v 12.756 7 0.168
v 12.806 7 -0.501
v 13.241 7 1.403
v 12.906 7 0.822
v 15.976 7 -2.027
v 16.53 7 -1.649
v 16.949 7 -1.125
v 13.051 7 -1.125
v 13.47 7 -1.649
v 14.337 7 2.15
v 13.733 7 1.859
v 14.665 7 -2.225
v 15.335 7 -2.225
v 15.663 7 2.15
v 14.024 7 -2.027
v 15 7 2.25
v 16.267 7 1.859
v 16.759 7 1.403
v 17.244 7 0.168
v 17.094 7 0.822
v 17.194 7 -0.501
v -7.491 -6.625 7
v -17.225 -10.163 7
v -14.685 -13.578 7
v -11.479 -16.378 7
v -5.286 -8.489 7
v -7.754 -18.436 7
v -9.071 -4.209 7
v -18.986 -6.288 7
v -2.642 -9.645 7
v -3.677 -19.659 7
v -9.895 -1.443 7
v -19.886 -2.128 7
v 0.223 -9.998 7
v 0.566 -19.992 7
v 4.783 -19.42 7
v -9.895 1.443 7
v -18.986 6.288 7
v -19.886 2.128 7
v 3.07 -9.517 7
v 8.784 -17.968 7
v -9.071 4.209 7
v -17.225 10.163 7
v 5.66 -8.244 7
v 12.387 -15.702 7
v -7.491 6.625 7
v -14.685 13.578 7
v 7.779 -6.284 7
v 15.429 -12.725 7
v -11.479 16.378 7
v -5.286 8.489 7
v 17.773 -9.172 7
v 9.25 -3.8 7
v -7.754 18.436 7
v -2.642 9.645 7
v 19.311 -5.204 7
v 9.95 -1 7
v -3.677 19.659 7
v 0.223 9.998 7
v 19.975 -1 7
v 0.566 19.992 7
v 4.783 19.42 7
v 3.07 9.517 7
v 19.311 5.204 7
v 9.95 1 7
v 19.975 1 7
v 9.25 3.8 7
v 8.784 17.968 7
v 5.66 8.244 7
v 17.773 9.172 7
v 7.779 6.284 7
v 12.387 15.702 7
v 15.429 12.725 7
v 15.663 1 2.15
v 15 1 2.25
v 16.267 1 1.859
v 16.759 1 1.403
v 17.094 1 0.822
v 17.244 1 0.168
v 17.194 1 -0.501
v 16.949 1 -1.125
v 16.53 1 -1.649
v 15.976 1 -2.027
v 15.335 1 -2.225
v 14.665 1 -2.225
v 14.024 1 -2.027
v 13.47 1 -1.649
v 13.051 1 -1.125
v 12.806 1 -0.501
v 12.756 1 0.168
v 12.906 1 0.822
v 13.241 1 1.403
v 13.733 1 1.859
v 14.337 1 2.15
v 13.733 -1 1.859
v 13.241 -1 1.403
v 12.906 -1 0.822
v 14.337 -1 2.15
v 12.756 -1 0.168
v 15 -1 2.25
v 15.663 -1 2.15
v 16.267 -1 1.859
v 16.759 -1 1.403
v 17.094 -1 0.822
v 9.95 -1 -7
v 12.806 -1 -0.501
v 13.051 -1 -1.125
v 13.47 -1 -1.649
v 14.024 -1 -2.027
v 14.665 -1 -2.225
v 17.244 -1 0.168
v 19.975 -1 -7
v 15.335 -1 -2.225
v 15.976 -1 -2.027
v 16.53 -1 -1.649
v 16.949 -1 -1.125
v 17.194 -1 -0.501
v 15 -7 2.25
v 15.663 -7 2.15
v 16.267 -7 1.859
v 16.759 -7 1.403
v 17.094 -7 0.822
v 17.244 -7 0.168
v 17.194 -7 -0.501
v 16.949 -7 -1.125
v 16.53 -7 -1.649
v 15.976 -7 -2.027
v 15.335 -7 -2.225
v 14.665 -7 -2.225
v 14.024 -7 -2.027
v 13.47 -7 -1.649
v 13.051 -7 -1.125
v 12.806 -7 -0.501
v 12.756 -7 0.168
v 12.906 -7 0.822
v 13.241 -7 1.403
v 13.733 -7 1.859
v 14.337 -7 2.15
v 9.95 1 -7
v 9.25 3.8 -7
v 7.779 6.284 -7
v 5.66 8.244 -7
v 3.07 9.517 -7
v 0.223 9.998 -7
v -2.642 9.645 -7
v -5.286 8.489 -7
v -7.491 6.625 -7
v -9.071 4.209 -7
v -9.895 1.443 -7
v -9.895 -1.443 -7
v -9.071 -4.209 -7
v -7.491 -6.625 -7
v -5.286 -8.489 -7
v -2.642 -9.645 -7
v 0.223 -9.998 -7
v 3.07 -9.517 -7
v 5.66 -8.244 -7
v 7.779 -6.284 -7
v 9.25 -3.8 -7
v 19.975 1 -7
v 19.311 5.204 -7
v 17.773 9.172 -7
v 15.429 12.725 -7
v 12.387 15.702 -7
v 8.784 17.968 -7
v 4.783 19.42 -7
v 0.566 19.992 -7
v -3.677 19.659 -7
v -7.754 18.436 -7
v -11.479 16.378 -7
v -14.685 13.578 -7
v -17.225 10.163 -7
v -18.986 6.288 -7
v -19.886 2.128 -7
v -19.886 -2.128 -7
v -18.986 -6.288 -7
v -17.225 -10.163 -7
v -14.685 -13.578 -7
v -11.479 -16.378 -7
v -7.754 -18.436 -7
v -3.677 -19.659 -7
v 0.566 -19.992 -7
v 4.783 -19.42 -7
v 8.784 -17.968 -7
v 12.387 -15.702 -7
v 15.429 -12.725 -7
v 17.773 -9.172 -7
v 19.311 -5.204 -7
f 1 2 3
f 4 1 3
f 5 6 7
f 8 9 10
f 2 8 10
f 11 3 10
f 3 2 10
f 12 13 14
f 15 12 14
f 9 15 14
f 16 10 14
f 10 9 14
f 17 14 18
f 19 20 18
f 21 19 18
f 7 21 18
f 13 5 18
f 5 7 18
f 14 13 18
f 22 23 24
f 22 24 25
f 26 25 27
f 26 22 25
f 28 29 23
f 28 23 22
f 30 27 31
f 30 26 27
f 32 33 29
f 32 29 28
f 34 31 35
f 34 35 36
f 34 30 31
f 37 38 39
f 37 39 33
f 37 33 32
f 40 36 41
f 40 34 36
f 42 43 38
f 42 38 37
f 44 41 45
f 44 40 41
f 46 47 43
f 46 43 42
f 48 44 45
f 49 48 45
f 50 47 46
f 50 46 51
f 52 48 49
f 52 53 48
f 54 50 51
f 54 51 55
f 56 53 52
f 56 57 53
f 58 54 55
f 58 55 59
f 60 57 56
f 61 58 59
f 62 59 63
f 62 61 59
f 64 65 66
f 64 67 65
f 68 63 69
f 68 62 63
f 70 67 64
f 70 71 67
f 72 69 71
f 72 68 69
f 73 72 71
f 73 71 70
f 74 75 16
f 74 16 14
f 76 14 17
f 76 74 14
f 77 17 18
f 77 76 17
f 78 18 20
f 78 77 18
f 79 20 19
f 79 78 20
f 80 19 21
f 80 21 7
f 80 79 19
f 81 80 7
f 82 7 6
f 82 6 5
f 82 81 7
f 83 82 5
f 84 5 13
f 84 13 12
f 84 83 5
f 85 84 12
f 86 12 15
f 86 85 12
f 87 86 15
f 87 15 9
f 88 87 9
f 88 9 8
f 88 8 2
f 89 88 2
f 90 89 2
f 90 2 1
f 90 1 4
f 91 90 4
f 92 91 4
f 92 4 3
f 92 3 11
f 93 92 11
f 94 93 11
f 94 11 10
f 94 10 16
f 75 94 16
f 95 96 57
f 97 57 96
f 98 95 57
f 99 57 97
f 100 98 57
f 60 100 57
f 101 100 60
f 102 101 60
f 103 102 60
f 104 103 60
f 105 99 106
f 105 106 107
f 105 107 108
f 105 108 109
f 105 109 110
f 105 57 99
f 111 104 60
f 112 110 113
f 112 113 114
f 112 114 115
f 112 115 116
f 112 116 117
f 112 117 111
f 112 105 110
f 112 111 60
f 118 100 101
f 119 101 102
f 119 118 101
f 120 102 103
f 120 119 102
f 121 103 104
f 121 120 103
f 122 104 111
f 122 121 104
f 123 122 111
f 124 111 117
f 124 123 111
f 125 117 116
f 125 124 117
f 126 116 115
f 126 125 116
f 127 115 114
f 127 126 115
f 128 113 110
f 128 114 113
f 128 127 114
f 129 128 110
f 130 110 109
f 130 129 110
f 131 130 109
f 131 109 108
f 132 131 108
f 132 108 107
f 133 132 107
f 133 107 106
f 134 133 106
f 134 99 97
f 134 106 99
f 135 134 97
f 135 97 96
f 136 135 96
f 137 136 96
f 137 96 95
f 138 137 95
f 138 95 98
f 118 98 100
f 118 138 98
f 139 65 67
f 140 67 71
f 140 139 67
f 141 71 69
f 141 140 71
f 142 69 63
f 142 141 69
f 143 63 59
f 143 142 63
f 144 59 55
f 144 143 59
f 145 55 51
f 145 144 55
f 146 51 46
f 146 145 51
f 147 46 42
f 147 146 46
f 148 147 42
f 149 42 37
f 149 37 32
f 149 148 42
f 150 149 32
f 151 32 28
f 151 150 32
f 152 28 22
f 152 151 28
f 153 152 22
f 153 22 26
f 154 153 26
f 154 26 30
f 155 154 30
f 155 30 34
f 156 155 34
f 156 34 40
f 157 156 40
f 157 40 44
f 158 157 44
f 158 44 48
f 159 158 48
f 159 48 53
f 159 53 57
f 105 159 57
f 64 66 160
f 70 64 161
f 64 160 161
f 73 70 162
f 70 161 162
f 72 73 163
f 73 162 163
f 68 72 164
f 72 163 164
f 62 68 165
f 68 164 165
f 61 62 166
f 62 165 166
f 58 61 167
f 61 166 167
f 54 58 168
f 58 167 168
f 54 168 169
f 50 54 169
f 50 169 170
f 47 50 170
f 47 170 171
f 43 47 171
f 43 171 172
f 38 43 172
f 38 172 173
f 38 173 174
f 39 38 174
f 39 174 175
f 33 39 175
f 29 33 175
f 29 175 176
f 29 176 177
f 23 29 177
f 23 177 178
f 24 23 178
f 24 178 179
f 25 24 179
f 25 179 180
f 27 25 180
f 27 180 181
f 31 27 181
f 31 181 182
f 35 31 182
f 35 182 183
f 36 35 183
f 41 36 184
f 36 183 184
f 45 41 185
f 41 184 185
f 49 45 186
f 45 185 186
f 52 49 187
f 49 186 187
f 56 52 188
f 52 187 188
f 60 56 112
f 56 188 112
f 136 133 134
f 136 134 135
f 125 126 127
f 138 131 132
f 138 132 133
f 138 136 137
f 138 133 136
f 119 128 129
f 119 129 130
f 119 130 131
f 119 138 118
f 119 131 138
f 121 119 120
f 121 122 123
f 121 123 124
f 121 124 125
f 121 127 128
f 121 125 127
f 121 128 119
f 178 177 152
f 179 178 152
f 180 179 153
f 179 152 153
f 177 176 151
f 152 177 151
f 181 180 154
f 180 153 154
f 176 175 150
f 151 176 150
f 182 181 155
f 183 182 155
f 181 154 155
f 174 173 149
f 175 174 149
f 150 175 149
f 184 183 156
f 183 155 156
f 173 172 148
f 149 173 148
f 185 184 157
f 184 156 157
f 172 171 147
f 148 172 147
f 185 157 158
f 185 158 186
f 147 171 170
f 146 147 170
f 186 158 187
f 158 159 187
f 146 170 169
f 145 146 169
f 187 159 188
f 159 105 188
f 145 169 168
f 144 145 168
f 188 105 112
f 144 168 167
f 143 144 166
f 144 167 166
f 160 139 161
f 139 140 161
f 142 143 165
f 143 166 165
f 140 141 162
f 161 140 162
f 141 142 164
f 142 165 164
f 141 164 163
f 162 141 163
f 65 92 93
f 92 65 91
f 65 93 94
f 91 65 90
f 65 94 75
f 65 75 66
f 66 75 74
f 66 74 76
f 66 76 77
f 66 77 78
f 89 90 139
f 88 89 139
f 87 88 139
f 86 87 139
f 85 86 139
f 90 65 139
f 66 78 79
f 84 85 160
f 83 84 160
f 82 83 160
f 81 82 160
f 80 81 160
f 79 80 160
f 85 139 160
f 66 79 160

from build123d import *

# Parameters (mm, degrees)
SKETCH_1_R          = 20
SKETCH_1_R_2        = 10
EXTRUDE_1_DEPTH     = 14
SKETCH_2_W          = 12
SKETCH_2_H          = 2
CUT_EXTRUDE_1_DEPTH = 32.559467676
SKETCH_4_R          = 2.25
CUT_EXTRUDE_3_DEPTH = 14


with BuildPart() as part:
    # 草图1 → 凸台-拉伸1 (new body)
    with BuildSketch(Plane.XY.offset(-7)):
        Circle(SKETCH_1_R)
        Circle(SKETCH_1_R_2, mode=Mode.SUBTRACT)
    extrude(amount=EXTRUDE_1_DEPTH)

    # 草图2 → 切除-拉伸1 (cut, through all)
    with BuildSketch(Plane.XY.offset(-7)):
        with Locations((15, 0)):
            Rectangle(SKETCH_2_W, SKETCH_2_H)
    extrude(amount=CUT_EXTRUDE_1_DEPTH, mode=Mode.SUBTRACT)

    # 草图4 → 切除-拉伸3 (cut)
    with BuildSketch(Plane(origin=(0, -7, 0), x_dir=(1, 0, 0), z_dir=(0, 1, 0))):
        with Locations(Location((15, 0, 0), (0, 0, 270))):
            Circle(SKETCH_4_R)
    extrude(amount=CUT_EXTRUDE_3_DEPTH, mode=Mode.SUBTRACT)


solid = part.part
